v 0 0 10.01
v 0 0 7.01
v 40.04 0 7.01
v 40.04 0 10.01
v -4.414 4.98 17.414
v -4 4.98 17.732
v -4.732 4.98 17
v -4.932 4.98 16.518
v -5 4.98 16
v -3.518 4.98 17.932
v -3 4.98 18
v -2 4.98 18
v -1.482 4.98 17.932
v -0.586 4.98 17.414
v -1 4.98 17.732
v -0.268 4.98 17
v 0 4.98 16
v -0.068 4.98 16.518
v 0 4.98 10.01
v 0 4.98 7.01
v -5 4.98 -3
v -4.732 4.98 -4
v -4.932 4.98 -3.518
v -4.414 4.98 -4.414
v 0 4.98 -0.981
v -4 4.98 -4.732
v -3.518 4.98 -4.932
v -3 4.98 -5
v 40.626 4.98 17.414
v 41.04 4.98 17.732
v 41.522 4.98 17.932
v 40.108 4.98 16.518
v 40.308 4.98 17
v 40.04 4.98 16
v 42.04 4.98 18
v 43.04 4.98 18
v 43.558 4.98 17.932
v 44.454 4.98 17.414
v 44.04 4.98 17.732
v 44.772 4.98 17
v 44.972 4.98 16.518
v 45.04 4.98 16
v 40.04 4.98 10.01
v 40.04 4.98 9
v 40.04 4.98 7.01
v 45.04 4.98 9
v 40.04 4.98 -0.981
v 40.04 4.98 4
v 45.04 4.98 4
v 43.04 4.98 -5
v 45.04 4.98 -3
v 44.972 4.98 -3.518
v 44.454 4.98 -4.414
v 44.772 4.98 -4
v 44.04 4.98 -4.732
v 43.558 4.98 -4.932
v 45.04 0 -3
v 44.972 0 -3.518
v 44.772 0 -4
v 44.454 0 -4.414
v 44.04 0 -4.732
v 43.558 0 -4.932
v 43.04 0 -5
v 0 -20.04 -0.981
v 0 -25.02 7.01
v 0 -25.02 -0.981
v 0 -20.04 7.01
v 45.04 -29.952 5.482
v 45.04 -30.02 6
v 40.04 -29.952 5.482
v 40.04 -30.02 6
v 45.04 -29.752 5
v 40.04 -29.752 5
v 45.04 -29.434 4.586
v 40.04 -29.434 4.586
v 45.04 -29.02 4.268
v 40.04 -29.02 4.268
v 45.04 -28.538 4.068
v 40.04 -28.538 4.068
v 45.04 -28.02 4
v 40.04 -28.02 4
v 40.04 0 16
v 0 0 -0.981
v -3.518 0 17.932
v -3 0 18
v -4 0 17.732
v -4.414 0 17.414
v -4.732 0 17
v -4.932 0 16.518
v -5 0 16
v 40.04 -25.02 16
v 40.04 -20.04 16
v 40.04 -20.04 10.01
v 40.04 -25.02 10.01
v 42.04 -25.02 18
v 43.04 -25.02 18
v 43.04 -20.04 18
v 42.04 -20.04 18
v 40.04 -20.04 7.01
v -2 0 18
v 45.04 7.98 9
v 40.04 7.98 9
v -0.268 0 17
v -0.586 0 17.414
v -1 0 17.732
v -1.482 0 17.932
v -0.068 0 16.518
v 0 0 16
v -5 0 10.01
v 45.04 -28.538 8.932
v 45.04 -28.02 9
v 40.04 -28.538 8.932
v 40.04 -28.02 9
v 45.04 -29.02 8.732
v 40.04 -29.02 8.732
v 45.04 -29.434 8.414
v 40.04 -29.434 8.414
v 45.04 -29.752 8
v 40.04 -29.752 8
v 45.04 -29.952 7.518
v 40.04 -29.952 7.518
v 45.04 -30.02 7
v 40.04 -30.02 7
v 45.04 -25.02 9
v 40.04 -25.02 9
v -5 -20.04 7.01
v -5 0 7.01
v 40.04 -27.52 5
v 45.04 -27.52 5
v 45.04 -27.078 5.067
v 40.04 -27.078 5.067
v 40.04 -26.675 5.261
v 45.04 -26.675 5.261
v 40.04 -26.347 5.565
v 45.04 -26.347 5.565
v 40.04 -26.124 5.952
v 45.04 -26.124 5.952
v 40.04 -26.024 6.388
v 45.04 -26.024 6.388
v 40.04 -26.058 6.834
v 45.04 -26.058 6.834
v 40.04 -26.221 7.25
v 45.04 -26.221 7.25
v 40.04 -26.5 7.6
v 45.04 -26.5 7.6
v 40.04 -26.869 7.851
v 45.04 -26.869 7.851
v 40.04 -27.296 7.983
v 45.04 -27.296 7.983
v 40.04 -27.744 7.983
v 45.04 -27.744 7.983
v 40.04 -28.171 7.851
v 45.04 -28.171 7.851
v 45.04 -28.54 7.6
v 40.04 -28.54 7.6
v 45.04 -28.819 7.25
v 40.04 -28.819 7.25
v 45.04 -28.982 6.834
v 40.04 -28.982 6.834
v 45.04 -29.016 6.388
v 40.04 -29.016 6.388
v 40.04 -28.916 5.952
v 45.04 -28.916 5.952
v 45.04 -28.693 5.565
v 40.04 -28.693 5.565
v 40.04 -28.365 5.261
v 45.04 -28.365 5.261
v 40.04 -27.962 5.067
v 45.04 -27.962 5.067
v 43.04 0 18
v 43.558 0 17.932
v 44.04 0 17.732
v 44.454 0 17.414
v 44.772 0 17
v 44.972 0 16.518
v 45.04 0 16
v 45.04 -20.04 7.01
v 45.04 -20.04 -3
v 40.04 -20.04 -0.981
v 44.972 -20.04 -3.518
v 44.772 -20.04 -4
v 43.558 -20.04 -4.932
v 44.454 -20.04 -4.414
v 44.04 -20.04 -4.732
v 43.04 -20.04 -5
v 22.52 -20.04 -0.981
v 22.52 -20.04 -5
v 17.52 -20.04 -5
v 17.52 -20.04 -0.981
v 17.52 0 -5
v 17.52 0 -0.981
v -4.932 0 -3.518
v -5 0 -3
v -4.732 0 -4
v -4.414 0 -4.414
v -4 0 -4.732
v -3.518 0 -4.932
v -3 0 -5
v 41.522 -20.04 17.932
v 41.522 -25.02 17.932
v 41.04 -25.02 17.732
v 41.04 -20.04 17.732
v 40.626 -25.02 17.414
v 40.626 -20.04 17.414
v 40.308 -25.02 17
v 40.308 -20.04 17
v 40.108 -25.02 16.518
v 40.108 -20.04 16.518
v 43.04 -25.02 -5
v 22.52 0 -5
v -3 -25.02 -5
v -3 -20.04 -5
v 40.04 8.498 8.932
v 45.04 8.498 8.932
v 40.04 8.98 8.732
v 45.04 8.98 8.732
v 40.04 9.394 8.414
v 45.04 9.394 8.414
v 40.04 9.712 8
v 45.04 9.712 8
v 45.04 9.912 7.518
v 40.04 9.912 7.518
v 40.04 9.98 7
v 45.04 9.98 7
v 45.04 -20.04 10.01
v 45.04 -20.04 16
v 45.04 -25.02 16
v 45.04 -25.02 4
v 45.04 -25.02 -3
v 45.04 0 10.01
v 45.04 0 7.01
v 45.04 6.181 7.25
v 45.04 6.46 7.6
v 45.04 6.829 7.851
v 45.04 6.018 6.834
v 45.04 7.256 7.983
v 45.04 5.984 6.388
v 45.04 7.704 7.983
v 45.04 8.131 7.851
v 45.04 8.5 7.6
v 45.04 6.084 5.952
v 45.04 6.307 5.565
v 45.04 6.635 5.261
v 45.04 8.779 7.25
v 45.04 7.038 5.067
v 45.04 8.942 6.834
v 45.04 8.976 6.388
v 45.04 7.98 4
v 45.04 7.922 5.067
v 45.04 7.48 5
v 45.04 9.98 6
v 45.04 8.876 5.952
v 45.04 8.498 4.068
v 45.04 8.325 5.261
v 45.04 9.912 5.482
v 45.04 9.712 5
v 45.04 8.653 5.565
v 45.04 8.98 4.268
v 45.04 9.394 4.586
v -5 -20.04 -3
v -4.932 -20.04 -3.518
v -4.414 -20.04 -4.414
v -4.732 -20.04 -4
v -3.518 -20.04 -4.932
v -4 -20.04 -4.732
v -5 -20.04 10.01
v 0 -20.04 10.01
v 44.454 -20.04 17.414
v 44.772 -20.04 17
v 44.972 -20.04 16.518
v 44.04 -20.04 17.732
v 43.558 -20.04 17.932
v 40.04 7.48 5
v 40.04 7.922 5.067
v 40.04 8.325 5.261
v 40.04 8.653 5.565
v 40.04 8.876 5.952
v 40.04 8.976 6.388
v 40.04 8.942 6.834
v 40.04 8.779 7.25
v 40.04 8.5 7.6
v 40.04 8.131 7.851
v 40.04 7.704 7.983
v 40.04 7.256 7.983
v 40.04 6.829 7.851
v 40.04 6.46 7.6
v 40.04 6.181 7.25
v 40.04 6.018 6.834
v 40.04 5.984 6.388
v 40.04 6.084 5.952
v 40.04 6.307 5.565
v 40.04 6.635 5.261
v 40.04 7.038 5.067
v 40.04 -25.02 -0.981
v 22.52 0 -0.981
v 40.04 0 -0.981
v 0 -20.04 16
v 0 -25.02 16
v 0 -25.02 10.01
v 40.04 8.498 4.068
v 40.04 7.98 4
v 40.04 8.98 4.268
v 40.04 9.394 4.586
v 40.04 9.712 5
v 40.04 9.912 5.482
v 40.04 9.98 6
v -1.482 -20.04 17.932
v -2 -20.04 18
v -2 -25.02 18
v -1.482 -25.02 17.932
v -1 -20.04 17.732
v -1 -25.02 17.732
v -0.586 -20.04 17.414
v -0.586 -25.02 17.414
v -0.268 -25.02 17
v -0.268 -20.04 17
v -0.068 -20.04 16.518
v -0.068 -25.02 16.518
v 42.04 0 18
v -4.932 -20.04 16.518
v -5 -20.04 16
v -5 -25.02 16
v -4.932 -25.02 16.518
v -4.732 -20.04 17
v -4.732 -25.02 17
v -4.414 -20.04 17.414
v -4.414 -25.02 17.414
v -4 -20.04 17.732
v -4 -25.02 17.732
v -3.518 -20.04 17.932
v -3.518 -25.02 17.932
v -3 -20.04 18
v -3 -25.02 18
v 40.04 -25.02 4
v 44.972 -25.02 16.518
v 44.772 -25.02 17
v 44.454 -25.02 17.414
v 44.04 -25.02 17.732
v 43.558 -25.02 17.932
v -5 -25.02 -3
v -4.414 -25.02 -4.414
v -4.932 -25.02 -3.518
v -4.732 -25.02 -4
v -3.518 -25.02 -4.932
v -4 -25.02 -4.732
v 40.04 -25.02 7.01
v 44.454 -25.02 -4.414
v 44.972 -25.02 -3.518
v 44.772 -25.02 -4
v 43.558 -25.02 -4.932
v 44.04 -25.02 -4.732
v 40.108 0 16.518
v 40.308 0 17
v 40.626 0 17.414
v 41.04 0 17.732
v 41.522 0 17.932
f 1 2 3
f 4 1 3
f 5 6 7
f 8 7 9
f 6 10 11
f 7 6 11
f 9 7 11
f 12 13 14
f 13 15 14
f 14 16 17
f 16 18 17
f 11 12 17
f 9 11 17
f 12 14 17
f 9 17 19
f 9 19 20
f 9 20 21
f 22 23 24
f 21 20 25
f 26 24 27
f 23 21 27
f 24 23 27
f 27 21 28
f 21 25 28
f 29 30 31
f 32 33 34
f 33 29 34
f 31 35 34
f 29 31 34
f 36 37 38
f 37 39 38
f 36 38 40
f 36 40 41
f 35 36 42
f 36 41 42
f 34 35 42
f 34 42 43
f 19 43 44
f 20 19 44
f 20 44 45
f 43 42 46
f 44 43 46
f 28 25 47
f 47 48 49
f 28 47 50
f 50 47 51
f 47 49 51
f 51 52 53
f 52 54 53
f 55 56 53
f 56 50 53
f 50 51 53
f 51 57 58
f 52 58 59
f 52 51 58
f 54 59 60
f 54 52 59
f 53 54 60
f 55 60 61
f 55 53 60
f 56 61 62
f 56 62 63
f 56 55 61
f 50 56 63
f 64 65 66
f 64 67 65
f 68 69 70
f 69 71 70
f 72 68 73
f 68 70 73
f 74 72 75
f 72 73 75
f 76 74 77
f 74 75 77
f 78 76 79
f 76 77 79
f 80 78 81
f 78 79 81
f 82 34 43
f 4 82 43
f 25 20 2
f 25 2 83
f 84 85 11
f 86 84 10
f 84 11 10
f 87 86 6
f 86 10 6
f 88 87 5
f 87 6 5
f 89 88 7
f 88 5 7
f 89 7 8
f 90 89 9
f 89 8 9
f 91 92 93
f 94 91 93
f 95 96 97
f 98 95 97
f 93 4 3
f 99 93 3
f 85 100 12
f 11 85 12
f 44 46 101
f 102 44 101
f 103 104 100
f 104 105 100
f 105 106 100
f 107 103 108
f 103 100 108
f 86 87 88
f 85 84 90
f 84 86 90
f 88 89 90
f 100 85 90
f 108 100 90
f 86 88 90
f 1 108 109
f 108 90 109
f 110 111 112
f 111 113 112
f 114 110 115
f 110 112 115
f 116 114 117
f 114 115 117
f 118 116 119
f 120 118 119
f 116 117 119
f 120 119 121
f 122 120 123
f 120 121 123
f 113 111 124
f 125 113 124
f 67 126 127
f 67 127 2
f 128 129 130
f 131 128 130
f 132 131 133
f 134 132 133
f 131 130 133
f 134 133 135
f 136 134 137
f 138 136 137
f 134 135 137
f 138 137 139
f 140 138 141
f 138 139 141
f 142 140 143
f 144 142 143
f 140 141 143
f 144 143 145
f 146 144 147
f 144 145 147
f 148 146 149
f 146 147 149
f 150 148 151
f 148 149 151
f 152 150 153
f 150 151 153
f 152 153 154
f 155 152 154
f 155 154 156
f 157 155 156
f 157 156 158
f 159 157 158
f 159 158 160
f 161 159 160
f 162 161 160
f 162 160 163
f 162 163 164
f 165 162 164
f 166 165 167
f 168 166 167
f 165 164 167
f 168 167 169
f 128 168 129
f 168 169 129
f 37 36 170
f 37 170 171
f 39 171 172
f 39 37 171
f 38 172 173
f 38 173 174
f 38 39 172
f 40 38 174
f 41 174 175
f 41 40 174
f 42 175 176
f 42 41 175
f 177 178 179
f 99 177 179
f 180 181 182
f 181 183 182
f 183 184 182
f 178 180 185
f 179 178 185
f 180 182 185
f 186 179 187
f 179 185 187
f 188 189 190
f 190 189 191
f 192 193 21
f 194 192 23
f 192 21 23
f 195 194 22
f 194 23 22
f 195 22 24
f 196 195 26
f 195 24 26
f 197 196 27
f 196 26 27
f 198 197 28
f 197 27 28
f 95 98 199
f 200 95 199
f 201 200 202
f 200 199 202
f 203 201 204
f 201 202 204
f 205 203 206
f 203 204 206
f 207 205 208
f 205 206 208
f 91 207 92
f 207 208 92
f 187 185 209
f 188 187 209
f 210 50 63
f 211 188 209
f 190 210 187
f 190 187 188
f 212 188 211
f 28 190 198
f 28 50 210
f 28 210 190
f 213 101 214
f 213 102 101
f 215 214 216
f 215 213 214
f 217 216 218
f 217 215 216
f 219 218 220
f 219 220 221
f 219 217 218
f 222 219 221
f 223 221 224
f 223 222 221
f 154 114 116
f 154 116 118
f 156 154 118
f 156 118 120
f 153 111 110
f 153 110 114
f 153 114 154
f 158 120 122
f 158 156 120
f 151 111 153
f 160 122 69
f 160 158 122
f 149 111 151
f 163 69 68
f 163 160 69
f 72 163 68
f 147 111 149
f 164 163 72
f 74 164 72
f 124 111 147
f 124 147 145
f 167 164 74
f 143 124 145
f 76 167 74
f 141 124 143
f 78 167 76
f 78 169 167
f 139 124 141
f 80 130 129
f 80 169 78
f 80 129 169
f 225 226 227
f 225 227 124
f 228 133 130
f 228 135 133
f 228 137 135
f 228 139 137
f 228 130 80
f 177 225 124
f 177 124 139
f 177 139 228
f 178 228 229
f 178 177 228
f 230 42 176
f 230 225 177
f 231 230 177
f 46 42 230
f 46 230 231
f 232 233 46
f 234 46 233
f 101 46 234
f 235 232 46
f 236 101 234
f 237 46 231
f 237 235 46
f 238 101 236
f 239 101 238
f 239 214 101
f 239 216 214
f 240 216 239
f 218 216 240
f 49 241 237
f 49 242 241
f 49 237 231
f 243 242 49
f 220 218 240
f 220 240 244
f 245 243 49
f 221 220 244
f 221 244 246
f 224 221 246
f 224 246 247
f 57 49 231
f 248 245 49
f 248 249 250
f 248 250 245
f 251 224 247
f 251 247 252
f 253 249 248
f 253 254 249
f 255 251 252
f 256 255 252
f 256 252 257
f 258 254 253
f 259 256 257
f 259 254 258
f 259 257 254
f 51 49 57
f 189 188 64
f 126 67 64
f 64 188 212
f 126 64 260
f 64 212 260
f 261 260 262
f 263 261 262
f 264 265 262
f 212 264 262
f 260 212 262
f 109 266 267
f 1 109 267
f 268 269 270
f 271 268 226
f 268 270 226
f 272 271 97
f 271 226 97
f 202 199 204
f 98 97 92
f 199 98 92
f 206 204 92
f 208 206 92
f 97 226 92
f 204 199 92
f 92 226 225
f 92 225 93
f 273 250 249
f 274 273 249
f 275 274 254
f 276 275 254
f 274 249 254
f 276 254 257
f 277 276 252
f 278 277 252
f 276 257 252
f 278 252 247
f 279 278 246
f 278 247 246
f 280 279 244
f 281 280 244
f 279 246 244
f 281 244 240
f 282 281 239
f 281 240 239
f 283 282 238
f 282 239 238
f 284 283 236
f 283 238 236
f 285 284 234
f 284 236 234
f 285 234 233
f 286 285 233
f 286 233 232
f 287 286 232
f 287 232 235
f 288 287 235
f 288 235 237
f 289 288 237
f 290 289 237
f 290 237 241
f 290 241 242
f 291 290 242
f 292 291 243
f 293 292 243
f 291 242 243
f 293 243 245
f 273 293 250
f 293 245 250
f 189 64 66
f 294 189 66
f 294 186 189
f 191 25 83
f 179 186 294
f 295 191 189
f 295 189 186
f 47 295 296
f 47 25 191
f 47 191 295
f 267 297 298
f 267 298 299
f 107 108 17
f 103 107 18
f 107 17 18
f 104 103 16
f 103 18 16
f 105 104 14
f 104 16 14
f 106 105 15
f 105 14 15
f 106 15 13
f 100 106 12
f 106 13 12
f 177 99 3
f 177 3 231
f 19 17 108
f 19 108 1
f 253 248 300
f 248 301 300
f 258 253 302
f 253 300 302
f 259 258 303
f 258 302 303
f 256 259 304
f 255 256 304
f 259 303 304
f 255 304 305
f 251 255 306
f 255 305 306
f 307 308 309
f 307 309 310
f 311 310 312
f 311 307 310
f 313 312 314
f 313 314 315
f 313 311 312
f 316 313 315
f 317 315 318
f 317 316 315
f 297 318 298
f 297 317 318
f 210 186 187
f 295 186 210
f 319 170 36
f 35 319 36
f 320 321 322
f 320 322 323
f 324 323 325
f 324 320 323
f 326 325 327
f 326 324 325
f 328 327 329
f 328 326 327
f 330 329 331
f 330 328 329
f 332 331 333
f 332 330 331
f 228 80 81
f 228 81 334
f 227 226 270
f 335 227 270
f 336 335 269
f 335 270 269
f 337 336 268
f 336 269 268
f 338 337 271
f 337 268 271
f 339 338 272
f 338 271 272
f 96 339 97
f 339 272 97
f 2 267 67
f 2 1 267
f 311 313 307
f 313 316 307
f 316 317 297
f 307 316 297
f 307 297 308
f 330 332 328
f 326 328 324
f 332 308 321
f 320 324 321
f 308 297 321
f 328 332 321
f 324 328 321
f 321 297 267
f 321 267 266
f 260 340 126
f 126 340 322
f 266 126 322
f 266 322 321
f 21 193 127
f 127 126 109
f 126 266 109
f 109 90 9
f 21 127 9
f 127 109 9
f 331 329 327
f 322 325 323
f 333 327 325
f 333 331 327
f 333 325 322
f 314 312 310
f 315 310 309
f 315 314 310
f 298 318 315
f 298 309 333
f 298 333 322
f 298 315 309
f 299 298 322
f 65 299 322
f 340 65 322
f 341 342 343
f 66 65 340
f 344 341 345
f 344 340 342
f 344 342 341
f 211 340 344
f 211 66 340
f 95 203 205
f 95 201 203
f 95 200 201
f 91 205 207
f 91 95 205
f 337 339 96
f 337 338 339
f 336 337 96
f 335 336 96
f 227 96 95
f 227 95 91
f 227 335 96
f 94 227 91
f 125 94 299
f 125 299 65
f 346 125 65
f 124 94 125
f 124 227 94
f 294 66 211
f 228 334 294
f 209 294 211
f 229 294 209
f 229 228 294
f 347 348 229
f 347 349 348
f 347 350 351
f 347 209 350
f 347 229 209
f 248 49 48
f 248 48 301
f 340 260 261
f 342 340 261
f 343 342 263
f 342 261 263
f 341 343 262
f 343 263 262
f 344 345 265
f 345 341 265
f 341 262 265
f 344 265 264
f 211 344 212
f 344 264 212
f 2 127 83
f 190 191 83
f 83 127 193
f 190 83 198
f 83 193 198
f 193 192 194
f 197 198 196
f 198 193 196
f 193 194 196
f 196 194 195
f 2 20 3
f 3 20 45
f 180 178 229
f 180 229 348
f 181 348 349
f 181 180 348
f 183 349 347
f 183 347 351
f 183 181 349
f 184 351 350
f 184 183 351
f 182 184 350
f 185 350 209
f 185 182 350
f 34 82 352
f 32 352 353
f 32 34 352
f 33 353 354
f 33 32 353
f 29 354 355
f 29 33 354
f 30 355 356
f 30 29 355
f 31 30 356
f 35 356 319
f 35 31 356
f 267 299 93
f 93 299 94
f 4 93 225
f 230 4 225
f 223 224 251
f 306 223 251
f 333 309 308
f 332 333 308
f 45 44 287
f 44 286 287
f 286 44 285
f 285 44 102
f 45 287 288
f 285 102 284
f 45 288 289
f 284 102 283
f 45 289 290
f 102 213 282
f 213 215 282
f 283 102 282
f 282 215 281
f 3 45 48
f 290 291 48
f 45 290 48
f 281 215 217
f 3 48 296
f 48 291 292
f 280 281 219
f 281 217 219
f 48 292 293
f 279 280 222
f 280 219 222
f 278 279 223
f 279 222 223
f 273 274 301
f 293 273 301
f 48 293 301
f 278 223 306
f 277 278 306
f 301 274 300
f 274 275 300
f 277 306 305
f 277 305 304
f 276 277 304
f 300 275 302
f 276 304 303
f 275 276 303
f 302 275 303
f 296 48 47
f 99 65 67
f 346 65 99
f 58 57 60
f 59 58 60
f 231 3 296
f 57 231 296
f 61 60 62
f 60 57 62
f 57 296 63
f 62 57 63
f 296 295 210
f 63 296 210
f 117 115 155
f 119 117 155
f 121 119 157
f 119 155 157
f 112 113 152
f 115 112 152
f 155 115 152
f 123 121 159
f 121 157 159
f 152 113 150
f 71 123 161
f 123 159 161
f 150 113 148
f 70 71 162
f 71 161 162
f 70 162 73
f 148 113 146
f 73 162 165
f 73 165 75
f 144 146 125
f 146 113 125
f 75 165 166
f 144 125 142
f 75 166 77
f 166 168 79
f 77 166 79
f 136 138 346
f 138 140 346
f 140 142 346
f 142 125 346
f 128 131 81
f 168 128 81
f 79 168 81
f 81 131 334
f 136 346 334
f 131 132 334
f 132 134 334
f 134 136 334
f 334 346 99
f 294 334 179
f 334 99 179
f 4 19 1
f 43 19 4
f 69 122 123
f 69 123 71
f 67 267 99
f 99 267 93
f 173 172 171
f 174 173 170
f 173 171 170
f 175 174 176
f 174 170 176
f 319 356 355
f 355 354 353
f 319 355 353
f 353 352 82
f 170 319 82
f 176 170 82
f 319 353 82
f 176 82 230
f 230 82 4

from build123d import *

# Parameters (mm, degrees)
SKETCH1_W           = 50.04
SKETCH1_H           = 30.04
SKETCH1_W_2         = 40.04
SKETCH1_H_2         = 20.04
SKETCH1_W_3         = 5
BOSS_EXTRUDE2_DEPTH = 28
SKETCH2_W           = 50.04
SKETCH2_H           = 30.04
SKETCH2_W_2         = 17.52
SKETCH2_H_2         = 20.04
BOSS_EXTRUDE3_DEPTH = 5
SKETCH3_W           = 5
SKETCH3_H           = 20.04
CUT_EXTRUDE1_DEPTH  = 27
SKETCH4_W           = 5
SKETCH4_H           = 20.04
CUT_EXTRUDE3_DEPTH  = 27
SKETCH5_W           = 40.04
SKETCH5_H           = 28.980890752
CUT_EXTRUDE4_DEPTH  = 47
SKETCH6_W           = 5
SKETCH6_H           = 5
BOSS_EXTRUDE4_DEPTH = 45
CUT_EXTRUDE5_DEPTH  = 66
SKETCH8_W           = 5
SKETCH8_H           = 3
BOSS_EXTRUDE5_DEPTH = 29
SKETCH9_W           = 40.04
SKETCH9_H           = 5
CUT_EXTRUDE6_DEPTH  = 51
SKETCH10_W          = 40.04
SKETCH10_H          = 3
BOSS_EXTRUDE6_DEPTH = 5
SKETCH12_W          = 40.04
SKETCH12_H          = 3
BOSS_EXTRUDE7_DEPTH = 5
FILLET1_R           = 2
SKETCH13_W          = 23
SKETCH13_H          = 0.02
CUT_EXTRUDE7_DEPTH  = 87
SKETCH14_W          = 5
SKETCH14_H          = 5
SKETCH14_R          = 1.5
BOSS_EXTRUDE8_DEPTH = 5
FILLET2_R           = 2


with BuildPart() as part:
    # Sketch1 → Boss-Extrude2 (new body)
    with BuildSketch(Plane.XY):
        with Locations((20.02, -10.02)):
            Rectangle(SKETCH1_W, SKETCH1_H)
        with Locations((20.02, -10.02)):
            Rectangle(SKETCH1_W_2, SKETCH1_H_2, mode=Mode.SUBTRACT)
        with Locations((20.02, -10.02)):
            Rectangle(SKETCH1_W_3, SKETCH1_H_2)
    extrude(amount=BOSS_EXTRUDE2_DEPTH)

    # Sketch2 → Boss-Extrude3 (add)
    with BuildSketch(Plane(origin=(0, 0, 0), x_dir=(-1, 0, 0), z_dir=(0, 0, -1))):
        with Locations((-20.02, -10.02)):
            Rectangle(SKETCH2_W, SKETCH2_H)
        with Locations((-31.28, -10.02)):
            Rectangle(SKETCH2_W_2, SKETCH2_H_2, mode=Mode.SUBTRACT)
        with Locations((-8.76, -10.02)):
            Rectangle(SKETCH2_W_2, SKETCH2_H_2, mode=Mode.SUBTRACT)
    extrude(amount=BOSS_EXTRUDE3_DEPTH)

    # Sketch3 → Cut-Extrude1 (cut)
    with BuildSketch(Plane.XY.offset(28)):
        with Locations((20.02, -10.02)):
            Rectangle(SKETCH3_W, SKETCH3_H)
    extrude(amount=-CUT_EXTRUDE1_DEPTH, mode=Mode.SUBTRACT)

    # Sketch4 → Cut-Extrude3 (cut)
    with BuildSketch(Plane(origin=(0, 0, -5), x_dir=(-1, 0, 0), z_dir=(0, 0, -1))):
        with Locations((-42.54, -10.02)):
            Rectangle(SKETCH4_W, SKETCH4_H)
        with Locations((2.5, -10.02)):
            Rectangle(SKETCH4_W, SKETCH4_H)
    extrude(amount=-CUT_EXTRUDE3_DEPTH, mode=Mode.SUBTRACT)

    # Sketch5 → Cut-Extrude4 (cut)
    with BuildSketch(Plane(origin=(0, 5, 0), x_dir=(1, 0, 0), z_dir=(0, 1, 0))):
        with Locations((20.02, -13.509554624)):
            Rectangle(SKETCH5_W, SKETCH5_H)
    extrude(amount=-CUT_EXTRUDE4_DEPTH, mode=Mode.SUBTRACT)

    # Sketch6 → Boss-Extrude4 (add)
    with BuildSketch(Plane(origin=(0, 0, 0), x_dir=(0, 0, -1), z_dir=(1, 0, 0))):
        with Locations((-11.5, 2.5)):
            Rectangle(SKETCH6_W, SKETCH6_H)
        with Locations((-11.5, -22.54)):
            Rectangle(SKETCH6_W, SKETCH6_H)
    extrude(amount=BOSS_EXTRUDE4_DEPTH)

    # Sketch7 → Cut-Extrude5 (cut)
    with BuildSketch(Plane(origin=(45.04, 0, 0), x_dir=(0, 0, -1), z_dir=(1, 0, 0))):
        Polygon((-28, -25.04), (-18, -25.04), (-18, -20.04), (-22, -20.04), (-22, 0), (-18, 0), (-18, 5), (-28, 5), align=None)
    extrude(amount=-CUT_EXTRUDE5_DEPTH, mode=Mode.SUBTRACT)

    # Sketch8 → Boss-Extrude5 (add)
    with BuildSketch(Plane.XZ.offset(25.04)):
        with Locations((-2.5, 8.509554624)):
            Rectangle(SKETCH8_W, SKETCH8_H)
        with Locations((42.54, 8.509554624)):
            Rectangle(SKETCH8_W, SKETCH8_H)
    extrude(amount=-BOSS_EXTRUDE5_DEPTH)

    # Sketch9 → Cut-Extrude6 (cut)
    with BuildSketch(Plane(origin=(0, -25.04, 0), x_dir=(-1, 0, 0), z_dir=(0, -1, 0))):
        with Locations((-20.02, -11.5)):
            Rectangle(SKETCH9_W, SKETCH9_H)
    extrude(amount=-CUT_EXTRUDE6_DEPTH, mode=Mode.SUBTRACT)

    # Sketch10 → Boss-Extrude6 (add)
    with BuildSketch(Plane.XZ.offset(25.04)):
        with Locations((20.02, 8.509554624)):
            Rectangle(SKETCH10_W, SKETCH10_H)
    extrude(amount=-BOSS_EXTRUDE6_DEPTH)

    # Sketch12 → Boss-Extrude7 (add)
    with BuildSketch(Plane(origin=(0, 5, 0), x_dir=(1, 0, 0), z_dir=(0, 1, 0))):
        with Locations((20.02, -8.509554624)):
            Rectangle(SKETCH12_W, SKETCH12_H)
    extrude(amount=-BOSS_EXTRUDE7_DEPTH)

    # Fillet1
    fillet1_edges = [part.edges().sort_by_distance(p)[0] for p in [
        (40.04, 2.5, 18),
        (0, 2.5, 18),
        (-5, 2.5, 18),
        (40.04, -22.54, 18),
        (0, -22.54, 18),
        (-5, -22.54, 18),
        (45.04, -22.54, 18),
        (45.04, 2.5, 18),
        (45.04, 2.5, -5),
        (-5, -22.54, -5),
        (45.04, -22.54, -5),
        (-5, 2.5, -5),
    ]]
    fillet(fillet1_edges, radius=FILLET1_R)

    # Sketch13 → Cut-Extrude7 (cut)
    with BuildSketch(Plane(origin=(45.04, 0, 0), x_dir=(0, 0, -1), z_dir=(1, 0, 0))):
        with Locations((-6.5, -25.03)):
            Rectangle(SKETCH13_W, SKETCH13_H)
        with Locations((-6.5, 4.99)):
            Rectangle(SKETCH13_W, SKETCH13_H)
    extrude(amount=-CUT_EXTRUDE7_DEPTH, mode=Mode.SUBTRACT)

    # Sketch14 → Boss-Extrude8 (add)
    with BuildSketch(Plane(origin=(45.04, 0, 0), x_dir=(0, 0, -1), z_dir=(1, 0, 0))):
        with Locations((-6.5, -27.52)):
            Rectangle(SKETCH14_W, SKETCH14_H)
        with Locations((-6.5, -27.52)):
            Circle(SKETCH14_R, mode=Mode.SUBTRACT)
        with Locations((-6.5, 7.48)):
            Rectangle(SKETCH14_W, SKETCH14_H)
        with Locations((-6.5, 7.48)):
            Circle(SKETCH14_R, mode=Mode.SUBTRACT)
    extrude(amount=-BOSS_EXTRUDE8_DEPTH)

    # Fillet2
    fillet2_edges = [part.edges().sort_by_distance(p)[0] for p in [
        (42.54, -30.02, 4),
        (42.54, -30.02, 9),
        (42.54, 9.98, 4),
        (42.54, 9.98, 9),
    ]]
    fillet(fillet2_edges, radius=FILLET2_R)


solid = part.part
